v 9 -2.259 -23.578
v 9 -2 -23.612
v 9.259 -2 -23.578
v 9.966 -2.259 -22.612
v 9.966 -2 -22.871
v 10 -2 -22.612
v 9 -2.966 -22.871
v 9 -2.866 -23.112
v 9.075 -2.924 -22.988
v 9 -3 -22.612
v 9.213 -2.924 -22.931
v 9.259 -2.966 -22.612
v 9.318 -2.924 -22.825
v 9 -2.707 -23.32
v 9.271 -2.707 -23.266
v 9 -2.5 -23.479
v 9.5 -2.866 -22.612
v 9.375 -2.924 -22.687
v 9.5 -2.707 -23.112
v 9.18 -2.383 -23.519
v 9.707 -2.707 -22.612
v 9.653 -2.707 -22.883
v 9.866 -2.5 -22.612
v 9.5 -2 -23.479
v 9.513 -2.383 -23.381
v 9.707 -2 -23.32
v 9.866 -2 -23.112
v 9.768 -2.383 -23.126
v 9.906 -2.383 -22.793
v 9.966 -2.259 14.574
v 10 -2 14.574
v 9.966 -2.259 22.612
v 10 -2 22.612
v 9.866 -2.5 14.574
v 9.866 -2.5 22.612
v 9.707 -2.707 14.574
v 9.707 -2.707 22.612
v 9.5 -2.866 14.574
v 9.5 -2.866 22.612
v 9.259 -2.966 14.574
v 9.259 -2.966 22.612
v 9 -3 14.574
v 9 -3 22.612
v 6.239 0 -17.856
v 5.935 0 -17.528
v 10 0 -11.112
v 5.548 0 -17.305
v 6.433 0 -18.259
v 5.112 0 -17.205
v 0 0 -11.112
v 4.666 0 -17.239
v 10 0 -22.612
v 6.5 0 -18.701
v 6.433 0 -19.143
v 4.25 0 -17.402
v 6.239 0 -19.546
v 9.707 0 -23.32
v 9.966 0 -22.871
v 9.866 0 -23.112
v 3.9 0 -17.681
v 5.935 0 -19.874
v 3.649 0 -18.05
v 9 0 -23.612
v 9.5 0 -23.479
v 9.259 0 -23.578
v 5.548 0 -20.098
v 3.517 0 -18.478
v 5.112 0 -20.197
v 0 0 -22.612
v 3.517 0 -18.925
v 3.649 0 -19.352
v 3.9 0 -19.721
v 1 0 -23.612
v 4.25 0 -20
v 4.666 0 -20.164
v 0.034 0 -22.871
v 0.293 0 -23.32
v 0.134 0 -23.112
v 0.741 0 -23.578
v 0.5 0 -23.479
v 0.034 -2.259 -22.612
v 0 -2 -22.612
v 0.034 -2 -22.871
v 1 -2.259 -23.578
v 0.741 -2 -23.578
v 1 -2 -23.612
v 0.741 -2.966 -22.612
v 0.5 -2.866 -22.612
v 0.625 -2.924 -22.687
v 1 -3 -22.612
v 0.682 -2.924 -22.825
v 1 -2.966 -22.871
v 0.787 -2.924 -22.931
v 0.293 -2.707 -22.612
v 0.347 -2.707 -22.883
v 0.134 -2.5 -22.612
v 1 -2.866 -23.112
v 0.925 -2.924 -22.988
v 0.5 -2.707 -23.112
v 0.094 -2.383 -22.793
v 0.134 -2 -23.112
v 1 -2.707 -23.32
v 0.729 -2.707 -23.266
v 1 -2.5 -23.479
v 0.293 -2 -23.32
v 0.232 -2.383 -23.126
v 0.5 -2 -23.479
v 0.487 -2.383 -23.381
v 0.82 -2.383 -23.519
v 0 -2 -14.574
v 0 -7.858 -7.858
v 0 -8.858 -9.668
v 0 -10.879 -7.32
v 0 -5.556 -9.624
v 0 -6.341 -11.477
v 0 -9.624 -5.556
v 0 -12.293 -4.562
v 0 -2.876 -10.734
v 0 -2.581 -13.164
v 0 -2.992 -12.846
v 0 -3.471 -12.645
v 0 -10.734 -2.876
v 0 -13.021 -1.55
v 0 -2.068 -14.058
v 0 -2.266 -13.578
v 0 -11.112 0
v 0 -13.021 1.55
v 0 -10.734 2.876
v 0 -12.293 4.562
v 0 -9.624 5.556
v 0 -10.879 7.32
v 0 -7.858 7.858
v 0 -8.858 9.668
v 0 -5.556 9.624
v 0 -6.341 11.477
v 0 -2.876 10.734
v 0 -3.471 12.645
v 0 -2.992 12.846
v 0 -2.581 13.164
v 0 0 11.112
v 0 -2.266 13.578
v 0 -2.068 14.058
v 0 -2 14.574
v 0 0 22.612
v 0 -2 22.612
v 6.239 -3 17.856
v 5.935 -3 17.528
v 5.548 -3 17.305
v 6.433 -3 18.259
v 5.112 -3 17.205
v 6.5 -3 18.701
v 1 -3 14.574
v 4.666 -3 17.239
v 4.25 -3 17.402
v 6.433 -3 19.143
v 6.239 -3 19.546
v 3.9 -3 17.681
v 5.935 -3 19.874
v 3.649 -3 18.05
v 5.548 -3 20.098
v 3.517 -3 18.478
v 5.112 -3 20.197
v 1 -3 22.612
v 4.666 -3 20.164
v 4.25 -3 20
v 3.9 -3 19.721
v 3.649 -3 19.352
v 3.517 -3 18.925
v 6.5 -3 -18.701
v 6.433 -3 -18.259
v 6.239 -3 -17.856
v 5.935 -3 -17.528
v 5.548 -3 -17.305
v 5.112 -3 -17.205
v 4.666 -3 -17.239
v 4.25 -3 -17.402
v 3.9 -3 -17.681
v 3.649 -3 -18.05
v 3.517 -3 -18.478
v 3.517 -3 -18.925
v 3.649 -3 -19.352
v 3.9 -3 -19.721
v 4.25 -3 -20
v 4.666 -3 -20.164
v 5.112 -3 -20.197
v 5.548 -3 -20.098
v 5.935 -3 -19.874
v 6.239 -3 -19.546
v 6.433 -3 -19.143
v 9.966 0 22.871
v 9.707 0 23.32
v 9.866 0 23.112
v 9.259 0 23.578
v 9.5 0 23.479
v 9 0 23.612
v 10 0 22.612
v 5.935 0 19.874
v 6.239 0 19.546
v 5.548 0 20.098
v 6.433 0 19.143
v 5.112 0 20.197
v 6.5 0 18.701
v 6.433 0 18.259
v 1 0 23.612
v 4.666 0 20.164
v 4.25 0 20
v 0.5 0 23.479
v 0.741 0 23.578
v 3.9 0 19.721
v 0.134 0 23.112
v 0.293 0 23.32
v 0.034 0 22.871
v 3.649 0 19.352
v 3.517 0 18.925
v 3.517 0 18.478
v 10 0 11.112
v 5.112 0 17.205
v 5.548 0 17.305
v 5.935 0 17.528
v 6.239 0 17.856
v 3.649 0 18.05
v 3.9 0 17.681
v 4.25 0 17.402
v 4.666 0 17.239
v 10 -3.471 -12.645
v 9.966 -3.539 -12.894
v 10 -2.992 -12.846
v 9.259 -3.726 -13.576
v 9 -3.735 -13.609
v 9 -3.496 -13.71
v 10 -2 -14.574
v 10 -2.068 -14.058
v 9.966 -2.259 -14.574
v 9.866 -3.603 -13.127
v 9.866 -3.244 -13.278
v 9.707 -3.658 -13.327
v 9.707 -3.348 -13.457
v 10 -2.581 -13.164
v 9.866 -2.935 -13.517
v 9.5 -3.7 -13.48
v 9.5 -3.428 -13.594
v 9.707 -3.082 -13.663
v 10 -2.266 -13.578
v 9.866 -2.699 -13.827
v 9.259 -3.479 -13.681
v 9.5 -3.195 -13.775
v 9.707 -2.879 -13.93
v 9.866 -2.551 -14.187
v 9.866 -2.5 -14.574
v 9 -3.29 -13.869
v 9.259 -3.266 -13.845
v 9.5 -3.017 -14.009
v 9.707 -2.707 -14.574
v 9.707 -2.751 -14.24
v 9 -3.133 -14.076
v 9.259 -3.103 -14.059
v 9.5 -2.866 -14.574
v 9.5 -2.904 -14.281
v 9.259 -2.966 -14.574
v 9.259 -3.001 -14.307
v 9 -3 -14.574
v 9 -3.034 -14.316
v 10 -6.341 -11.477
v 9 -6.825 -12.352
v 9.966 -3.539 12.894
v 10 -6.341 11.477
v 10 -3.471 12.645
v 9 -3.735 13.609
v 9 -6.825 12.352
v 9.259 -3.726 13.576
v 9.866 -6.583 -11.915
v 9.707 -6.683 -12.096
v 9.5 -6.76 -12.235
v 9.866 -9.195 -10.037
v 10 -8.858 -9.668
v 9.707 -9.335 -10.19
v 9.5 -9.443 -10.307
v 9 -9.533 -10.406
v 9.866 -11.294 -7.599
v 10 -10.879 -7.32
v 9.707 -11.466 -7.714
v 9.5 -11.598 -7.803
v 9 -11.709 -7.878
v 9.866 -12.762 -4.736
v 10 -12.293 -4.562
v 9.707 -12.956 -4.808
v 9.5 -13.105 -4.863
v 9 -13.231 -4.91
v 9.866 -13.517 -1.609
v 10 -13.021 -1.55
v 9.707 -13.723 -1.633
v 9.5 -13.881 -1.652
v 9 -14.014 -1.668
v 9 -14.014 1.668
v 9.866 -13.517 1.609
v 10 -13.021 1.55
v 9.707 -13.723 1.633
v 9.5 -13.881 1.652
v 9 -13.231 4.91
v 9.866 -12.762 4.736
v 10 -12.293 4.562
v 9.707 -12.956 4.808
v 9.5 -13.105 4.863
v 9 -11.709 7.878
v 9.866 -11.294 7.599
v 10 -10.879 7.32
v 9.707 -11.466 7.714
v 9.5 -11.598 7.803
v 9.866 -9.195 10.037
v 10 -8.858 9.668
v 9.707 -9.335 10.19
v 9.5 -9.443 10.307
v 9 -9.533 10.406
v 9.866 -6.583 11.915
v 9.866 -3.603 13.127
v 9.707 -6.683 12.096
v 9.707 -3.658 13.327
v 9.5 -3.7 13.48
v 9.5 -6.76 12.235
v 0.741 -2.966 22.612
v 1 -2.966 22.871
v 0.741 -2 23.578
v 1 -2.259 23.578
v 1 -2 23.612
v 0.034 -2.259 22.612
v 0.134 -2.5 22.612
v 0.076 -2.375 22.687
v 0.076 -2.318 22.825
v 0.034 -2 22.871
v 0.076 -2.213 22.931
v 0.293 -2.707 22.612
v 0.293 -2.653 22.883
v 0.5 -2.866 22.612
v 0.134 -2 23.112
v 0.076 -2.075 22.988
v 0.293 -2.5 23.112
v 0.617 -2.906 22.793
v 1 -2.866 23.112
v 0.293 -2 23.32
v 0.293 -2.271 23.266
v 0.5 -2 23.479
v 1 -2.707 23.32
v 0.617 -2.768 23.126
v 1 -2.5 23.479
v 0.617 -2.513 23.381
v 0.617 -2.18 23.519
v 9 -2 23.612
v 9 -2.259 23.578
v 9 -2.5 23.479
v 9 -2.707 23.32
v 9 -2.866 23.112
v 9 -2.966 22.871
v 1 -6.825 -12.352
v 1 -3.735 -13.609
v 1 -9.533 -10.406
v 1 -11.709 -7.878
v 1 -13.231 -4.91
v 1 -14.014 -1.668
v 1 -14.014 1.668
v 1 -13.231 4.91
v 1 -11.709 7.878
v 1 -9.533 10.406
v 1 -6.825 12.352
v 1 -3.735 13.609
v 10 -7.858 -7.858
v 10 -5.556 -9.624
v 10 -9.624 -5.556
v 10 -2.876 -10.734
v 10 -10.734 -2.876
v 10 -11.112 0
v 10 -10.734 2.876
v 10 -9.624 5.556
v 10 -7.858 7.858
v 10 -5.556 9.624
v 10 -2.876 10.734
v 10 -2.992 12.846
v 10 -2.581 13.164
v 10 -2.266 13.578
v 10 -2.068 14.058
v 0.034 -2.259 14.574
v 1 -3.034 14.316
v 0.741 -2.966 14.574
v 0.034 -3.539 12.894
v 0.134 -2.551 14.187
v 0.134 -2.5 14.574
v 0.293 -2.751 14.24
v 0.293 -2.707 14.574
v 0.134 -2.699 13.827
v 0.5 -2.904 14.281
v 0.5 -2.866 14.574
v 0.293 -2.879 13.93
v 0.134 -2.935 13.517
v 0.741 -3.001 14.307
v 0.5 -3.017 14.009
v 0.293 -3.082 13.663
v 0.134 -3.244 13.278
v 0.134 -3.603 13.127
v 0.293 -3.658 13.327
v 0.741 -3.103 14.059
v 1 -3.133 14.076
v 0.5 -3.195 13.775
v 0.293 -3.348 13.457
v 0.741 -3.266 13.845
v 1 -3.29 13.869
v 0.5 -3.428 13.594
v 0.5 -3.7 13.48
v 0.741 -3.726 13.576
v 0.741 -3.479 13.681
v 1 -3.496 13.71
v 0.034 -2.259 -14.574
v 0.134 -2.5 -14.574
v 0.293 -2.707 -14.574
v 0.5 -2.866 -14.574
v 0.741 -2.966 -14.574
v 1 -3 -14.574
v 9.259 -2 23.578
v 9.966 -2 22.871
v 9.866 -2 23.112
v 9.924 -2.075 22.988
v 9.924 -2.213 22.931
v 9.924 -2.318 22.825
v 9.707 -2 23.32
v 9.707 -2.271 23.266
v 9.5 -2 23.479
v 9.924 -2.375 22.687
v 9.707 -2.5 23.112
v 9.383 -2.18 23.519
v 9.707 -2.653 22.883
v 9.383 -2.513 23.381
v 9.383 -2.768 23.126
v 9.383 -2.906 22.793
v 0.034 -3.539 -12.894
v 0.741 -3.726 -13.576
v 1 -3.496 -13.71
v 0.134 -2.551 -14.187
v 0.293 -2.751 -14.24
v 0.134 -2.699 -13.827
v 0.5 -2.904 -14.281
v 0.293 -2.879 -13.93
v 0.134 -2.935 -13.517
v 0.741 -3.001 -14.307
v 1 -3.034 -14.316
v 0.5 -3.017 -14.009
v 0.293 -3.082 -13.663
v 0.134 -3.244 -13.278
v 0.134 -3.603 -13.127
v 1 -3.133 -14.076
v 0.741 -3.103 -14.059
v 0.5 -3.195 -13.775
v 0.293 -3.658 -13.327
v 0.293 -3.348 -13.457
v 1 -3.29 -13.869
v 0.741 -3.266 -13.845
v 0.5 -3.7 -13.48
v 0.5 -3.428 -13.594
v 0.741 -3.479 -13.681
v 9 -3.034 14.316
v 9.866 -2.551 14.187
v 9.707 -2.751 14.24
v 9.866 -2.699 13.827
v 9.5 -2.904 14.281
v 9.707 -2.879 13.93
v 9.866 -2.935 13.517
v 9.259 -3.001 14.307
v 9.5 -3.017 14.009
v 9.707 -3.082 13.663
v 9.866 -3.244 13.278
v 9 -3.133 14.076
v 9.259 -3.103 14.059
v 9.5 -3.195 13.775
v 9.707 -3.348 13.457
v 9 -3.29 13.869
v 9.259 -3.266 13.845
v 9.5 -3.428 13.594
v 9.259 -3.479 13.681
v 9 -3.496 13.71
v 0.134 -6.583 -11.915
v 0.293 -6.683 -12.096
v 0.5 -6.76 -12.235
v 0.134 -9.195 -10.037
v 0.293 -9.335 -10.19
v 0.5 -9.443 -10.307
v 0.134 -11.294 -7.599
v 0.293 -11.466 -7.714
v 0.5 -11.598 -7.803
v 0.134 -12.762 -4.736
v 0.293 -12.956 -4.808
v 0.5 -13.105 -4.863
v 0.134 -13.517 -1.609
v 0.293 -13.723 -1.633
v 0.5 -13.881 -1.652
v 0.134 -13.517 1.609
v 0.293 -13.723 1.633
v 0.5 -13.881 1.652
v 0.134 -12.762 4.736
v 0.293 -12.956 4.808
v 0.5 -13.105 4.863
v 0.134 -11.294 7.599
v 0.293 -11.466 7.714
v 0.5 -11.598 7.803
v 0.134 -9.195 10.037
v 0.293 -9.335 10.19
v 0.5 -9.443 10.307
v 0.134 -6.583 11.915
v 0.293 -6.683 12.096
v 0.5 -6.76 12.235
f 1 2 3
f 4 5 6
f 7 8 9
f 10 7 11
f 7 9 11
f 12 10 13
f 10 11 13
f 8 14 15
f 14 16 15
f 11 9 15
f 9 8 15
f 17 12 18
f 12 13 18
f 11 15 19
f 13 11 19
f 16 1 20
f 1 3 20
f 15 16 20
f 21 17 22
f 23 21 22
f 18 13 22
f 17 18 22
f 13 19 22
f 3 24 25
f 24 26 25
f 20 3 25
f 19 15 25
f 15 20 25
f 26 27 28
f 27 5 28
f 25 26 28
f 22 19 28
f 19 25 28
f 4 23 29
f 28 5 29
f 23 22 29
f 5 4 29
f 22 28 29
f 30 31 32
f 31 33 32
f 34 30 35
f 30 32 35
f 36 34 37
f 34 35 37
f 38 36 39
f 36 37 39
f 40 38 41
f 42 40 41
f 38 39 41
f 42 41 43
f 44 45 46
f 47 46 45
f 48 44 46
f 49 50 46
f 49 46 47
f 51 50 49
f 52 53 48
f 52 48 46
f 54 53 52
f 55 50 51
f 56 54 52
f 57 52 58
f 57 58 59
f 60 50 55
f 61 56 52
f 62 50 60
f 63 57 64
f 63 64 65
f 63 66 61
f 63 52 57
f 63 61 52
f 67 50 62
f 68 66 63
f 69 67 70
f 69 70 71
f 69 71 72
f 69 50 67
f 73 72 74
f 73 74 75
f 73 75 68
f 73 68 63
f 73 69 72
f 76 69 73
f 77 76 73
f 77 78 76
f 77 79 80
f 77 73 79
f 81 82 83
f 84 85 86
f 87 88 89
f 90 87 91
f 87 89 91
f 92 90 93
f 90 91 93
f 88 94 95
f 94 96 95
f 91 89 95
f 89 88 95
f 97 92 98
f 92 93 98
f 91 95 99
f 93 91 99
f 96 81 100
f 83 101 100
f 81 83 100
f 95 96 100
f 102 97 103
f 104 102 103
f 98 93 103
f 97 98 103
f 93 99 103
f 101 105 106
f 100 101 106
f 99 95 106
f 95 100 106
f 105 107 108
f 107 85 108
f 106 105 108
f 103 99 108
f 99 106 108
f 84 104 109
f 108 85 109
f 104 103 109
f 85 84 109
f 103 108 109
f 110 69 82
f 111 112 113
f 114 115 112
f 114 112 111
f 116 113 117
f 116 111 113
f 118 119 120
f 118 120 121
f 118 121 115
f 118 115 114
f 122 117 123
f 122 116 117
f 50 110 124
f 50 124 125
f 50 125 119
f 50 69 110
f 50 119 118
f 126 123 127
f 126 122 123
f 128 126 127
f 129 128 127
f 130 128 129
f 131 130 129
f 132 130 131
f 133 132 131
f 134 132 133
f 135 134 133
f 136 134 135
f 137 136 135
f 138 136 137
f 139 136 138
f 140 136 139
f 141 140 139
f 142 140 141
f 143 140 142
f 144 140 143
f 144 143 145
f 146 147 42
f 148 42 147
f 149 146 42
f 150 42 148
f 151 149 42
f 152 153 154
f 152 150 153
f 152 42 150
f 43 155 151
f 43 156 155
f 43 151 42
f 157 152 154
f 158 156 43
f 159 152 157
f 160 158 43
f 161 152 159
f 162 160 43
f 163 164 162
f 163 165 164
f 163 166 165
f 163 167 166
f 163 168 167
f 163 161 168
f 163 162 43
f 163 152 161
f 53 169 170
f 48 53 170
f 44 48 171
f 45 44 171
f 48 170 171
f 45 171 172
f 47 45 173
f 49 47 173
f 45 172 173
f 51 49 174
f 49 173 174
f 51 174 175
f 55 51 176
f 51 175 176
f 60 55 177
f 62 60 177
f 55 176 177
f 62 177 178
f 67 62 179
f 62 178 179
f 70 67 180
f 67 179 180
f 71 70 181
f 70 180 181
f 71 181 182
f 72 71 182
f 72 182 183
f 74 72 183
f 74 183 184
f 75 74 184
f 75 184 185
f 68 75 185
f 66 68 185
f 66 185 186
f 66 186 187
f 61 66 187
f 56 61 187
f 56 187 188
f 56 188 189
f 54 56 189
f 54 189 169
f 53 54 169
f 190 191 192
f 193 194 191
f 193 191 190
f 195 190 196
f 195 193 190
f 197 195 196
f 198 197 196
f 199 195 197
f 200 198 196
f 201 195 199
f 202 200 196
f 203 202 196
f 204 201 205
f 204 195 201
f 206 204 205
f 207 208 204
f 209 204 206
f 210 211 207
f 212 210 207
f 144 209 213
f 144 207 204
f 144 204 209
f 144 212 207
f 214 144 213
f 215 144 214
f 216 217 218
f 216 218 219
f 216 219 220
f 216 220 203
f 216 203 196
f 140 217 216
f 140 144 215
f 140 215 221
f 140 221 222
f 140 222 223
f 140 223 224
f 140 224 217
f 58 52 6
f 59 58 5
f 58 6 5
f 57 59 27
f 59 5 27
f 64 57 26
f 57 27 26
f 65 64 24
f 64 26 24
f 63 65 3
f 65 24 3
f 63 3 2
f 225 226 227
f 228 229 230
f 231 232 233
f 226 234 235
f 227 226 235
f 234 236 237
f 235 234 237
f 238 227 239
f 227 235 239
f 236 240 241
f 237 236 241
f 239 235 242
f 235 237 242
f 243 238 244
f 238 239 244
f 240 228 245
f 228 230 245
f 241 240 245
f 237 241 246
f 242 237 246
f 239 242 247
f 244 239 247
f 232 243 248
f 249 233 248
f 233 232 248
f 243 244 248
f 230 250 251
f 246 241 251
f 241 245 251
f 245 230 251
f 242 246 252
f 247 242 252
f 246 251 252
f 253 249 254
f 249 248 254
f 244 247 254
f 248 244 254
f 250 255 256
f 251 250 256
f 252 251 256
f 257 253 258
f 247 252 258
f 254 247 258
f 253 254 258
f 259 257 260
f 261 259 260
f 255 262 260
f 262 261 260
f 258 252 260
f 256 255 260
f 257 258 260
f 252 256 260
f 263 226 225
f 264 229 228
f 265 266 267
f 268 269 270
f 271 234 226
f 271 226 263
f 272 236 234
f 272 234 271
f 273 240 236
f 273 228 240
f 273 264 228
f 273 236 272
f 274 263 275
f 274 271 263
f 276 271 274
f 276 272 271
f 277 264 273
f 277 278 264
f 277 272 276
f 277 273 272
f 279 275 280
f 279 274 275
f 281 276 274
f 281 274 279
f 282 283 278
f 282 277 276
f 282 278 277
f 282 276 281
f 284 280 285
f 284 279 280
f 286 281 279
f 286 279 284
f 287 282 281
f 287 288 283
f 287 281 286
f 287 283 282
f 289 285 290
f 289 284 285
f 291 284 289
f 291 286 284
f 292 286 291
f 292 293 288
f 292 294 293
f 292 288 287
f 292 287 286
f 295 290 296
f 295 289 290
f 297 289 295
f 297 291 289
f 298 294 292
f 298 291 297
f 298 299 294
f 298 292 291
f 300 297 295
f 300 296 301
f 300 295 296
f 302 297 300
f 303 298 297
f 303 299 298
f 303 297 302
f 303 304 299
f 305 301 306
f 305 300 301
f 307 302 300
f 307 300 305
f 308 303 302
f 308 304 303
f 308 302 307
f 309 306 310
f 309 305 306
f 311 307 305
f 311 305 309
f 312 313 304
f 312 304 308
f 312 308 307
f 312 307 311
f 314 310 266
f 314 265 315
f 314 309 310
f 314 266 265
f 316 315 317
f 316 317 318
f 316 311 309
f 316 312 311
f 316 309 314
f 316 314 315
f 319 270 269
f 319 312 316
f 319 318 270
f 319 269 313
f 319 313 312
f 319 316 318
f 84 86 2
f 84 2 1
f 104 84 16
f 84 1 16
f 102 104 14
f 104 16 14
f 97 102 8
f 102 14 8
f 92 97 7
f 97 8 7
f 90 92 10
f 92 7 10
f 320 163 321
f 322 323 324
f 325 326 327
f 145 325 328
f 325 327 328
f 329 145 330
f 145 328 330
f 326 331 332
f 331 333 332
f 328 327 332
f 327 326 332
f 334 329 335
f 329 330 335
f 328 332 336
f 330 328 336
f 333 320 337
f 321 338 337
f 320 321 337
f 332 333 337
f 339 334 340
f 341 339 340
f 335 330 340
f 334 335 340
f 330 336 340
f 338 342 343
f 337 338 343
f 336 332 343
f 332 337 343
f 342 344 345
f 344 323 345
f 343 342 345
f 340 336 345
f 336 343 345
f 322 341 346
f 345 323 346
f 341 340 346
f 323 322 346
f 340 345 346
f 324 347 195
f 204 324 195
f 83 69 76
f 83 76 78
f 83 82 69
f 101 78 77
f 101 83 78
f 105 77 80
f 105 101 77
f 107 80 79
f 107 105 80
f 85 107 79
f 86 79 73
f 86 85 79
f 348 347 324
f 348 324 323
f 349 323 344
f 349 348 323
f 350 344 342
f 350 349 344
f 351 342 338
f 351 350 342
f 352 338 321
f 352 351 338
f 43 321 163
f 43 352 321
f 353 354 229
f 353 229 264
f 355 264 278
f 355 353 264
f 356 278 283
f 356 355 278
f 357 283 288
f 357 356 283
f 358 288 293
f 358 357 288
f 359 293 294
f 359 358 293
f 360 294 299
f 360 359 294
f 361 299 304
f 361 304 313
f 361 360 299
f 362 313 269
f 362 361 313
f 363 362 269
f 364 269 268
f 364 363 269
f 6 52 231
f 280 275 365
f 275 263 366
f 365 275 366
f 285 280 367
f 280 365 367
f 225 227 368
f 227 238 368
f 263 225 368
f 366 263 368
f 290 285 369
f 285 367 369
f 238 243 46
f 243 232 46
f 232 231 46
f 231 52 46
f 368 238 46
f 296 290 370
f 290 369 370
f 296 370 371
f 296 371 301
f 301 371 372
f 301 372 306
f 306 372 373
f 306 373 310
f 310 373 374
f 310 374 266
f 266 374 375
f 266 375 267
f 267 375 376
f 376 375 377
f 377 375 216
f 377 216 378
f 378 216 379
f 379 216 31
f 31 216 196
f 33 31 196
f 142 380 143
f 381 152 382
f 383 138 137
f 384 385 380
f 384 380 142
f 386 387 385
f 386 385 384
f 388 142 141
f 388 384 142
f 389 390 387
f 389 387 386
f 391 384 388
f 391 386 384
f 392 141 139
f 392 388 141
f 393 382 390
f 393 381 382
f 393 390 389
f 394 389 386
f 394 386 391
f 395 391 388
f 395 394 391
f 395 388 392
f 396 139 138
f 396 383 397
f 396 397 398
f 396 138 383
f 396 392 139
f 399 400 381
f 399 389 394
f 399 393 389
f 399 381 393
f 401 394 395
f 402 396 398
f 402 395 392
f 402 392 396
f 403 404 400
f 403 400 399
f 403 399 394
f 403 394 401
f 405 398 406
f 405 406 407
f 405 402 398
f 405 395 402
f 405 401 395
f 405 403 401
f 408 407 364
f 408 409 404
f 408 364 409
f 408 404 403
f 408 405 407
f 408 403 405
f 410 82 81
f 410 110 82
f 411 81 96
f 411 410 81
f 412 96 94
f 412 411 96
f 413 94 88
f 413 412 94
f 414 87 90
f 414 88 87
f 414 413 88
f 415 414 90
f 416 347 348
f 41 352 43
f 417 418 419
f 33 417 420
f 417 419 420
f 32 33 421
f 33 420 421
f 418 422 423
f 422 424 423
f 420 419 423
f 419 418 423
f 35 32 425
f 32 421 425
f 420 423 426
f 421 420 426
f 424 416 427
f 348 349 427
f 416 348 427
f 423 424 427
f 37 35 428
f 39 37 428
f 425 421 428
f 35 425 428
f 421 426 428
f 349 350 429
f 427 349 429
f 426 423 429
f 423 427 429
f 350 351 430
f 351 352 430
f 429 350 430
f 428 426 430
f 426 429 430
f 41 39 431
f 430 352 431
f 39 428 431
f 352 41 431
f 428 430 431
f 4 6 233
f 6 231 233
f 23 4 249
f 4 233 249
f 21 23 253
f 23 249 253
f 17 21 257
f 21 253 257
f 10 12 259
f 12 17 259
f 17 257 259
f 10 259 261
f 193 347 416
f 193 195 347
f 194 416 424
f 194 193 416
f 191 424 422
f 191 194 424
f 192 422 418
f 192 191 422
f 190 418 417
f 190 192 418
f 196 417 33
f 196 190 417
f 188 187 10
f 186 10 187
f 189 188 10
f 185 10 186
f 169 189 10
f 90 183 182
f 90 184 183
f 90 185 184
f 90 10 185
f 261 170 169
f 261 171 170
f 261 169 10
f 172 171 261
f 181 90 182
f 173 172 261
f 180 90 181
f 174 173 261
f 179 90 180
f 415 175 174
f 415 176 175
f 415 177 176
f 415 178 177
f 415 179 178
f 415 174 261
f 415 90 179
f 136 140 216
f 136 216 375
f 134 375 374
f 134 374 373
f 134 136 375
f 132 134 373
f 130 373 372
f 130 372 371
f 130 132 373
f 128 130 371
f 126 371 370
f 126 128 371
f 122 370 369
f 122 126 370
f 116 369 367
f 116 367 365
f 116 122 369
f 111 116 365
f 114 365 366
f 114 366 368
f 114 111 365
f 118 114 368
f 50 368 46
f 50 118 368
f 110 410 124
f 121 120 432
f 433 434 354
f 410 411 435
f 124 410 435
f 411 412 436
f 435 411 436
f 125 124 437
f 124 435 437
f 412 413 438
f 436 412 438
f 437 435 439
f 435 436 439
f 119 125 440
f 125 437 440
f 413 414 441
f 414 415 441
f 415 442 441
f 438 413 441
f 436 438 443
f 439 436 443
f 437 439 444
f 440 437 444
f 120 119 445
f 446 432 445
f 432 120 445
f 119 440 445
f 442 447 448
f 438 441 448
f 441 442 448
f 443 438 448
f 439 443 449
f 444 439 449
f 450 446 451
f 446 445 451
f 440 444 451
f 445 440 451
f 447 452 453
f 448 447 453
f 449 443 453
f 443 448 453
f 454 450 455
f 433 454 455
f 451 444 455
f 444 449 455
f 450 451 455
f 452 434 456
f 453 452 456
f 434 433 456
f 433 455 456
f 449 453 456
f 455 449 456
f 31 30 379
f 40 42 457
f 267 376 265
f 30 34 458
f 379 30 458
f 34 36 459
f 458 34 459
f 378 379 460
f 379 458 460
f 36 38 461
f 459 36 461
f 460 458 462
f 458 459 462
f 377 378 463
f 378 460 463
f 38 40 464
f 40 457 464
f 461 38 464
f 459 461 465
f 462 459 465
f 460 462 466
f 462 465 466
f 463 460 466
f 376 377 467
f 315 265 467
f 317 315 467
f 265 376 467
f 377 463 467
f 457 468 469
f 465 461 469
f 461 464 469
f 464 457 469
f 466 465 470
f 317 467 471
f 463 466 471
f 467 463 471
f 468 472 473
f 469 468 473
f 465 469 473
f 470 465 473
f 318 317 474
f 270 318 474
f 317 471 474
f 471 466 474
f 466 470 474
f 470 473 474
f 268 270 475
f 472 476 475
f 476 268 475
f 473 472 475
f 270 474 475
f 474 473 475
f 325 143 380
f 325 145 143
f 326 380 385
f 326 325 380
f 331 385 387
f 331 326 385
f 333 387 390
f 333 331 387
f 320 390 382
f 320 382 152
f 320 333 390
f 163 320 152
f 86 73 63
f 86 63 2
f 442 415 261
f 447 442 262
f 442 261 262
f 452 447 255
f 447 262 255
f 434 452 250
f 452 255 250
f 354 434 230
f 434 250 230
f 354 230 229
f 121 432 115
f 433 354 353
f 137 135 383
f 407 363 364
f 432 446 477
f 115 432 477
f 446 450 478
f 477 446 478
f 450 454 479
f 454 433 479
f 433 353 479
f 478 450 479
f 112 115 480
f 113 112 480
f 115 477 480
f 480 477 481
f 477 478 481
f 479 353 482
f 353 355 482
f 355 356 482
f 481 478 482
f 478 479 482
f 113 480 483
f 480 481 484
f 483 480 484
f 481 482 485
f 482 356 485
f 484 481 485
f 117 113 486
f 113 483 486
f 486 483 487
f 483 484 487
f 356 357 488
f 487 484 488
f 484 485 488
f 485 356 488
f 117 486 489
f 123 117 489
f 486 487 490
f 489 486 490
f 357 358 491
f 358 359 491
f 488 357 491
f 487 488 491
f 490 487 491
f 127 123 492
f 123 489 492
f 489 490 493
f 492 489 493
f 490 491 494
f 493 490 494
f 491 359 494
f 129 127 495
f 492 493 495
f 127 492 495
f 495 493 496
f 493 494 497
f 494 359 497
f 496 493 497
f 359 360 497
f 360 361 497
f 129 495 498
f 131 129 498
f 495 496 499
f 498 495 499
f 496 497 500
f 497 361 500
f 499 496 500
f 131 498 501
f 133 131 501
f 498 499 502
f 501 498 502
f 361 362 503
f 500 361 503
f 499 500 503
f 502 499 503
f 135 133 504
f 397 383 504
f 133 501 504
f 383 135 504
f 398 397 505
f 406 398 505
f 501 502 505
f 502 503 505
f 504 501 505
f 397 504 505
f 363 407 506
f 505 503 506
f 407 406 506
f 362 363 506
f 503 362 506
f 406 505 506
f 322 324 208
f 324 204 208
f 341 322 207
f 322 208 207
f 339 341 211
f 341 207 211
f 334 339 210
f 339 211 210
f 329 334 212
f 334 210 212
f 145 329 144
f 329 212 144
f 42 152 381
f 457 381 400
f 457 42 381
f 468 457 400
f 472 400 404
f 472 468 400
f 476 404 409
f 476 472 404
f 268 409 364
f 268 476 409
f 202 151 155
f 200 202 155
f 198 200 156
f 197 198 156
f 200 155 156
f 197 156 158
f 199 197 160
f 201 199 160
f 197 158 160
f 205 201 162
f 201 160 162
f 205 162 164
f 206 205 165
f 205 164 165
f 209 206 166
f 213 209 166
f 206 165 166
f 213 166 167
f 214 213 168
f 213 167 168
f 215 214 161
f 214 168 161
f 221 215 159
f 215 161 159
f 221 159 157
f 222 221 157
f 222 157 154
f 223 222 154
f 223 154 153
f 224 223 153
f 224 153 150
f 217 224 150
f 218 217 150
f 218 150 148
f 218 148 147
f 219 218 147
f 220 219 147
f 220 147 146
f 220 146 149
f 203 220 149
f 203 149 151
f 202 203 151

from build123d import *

# Parameters (mm, degrees)
CLAMP_EXTRUDE_DEPTH     = 10
HOLE_R                  = 1.5
HOLES_CUT_EXTRUDE_DEPTH = 4
FILLET1_R               = 1


with BuildPart() as part:
    # Sketch4 → Clamp Extrude (new body)
    with BuildSketch(Plane(origin=(0, 0, 0), x_dir=(0, 0, -1), z_dir=(1, 0, 0))):
        with BuildLine():
            Line((-23.6125, 0), (-11.1125, 0))
            ThreePointArc((-11.1125, 0), (0, -11.1125), (11.1125, 0))
            Line((11.1125, 0), (23.6125, 0))
            Line((23.6125, 0), (23.6125, -3))
            Line((23.6125, -3), (13.789947652, -3))
            ThreePointArc((13.789947652, -3), (0, -14.1125), (-13.789947652, -3))
            Line((-13.789947652, -3), (-23.6125, -3))
            Line((-23.6125, -3), (-23.6125, 0))
        make_face()
    extrude(amount=CLAMP_EXTRUDE_DEPTH)

    # Hole → Holes Cut-Extrude (cut, through all)
    with BuildSketch(Plane.XZ.offset(3)):
        with Locations((5, 18.701223826)):
            Circle(HOLE_R)
        with Locations((5, -18.701223826)):
            Circle(HOLE_R)
    extrude(amount=-HOLES_CUT_EXTRUDE_DEPTH, mode=Mode.SUBTRACT)

    # Fillet1
    fillet1_edges = [part.edges().sort_by_distance(p)[0] for p in [
        (0, -1.5, -23.6125),
        (0, -3, -18.701223826),
        (0, -14.1125, 0),
        (10, -1.5, -23.6125),
        (5, -3, 13.789947652),
        (5, -3, 23.6125),
        (5, -3, -23.6125),
        (5, -3, -13.789947652),
        (10, -1.5, 23.6125),
        (10, -3, 18.701223826),
        (10, -14.1125, 0),
        (0, -3, 18.701223826),
        (10, -3, -18.701223826),
        (0, -1.5, 23.6125),
    ]]
    fillet(fillet1_edges, radius=FILLET1_R)


solid = part.part
